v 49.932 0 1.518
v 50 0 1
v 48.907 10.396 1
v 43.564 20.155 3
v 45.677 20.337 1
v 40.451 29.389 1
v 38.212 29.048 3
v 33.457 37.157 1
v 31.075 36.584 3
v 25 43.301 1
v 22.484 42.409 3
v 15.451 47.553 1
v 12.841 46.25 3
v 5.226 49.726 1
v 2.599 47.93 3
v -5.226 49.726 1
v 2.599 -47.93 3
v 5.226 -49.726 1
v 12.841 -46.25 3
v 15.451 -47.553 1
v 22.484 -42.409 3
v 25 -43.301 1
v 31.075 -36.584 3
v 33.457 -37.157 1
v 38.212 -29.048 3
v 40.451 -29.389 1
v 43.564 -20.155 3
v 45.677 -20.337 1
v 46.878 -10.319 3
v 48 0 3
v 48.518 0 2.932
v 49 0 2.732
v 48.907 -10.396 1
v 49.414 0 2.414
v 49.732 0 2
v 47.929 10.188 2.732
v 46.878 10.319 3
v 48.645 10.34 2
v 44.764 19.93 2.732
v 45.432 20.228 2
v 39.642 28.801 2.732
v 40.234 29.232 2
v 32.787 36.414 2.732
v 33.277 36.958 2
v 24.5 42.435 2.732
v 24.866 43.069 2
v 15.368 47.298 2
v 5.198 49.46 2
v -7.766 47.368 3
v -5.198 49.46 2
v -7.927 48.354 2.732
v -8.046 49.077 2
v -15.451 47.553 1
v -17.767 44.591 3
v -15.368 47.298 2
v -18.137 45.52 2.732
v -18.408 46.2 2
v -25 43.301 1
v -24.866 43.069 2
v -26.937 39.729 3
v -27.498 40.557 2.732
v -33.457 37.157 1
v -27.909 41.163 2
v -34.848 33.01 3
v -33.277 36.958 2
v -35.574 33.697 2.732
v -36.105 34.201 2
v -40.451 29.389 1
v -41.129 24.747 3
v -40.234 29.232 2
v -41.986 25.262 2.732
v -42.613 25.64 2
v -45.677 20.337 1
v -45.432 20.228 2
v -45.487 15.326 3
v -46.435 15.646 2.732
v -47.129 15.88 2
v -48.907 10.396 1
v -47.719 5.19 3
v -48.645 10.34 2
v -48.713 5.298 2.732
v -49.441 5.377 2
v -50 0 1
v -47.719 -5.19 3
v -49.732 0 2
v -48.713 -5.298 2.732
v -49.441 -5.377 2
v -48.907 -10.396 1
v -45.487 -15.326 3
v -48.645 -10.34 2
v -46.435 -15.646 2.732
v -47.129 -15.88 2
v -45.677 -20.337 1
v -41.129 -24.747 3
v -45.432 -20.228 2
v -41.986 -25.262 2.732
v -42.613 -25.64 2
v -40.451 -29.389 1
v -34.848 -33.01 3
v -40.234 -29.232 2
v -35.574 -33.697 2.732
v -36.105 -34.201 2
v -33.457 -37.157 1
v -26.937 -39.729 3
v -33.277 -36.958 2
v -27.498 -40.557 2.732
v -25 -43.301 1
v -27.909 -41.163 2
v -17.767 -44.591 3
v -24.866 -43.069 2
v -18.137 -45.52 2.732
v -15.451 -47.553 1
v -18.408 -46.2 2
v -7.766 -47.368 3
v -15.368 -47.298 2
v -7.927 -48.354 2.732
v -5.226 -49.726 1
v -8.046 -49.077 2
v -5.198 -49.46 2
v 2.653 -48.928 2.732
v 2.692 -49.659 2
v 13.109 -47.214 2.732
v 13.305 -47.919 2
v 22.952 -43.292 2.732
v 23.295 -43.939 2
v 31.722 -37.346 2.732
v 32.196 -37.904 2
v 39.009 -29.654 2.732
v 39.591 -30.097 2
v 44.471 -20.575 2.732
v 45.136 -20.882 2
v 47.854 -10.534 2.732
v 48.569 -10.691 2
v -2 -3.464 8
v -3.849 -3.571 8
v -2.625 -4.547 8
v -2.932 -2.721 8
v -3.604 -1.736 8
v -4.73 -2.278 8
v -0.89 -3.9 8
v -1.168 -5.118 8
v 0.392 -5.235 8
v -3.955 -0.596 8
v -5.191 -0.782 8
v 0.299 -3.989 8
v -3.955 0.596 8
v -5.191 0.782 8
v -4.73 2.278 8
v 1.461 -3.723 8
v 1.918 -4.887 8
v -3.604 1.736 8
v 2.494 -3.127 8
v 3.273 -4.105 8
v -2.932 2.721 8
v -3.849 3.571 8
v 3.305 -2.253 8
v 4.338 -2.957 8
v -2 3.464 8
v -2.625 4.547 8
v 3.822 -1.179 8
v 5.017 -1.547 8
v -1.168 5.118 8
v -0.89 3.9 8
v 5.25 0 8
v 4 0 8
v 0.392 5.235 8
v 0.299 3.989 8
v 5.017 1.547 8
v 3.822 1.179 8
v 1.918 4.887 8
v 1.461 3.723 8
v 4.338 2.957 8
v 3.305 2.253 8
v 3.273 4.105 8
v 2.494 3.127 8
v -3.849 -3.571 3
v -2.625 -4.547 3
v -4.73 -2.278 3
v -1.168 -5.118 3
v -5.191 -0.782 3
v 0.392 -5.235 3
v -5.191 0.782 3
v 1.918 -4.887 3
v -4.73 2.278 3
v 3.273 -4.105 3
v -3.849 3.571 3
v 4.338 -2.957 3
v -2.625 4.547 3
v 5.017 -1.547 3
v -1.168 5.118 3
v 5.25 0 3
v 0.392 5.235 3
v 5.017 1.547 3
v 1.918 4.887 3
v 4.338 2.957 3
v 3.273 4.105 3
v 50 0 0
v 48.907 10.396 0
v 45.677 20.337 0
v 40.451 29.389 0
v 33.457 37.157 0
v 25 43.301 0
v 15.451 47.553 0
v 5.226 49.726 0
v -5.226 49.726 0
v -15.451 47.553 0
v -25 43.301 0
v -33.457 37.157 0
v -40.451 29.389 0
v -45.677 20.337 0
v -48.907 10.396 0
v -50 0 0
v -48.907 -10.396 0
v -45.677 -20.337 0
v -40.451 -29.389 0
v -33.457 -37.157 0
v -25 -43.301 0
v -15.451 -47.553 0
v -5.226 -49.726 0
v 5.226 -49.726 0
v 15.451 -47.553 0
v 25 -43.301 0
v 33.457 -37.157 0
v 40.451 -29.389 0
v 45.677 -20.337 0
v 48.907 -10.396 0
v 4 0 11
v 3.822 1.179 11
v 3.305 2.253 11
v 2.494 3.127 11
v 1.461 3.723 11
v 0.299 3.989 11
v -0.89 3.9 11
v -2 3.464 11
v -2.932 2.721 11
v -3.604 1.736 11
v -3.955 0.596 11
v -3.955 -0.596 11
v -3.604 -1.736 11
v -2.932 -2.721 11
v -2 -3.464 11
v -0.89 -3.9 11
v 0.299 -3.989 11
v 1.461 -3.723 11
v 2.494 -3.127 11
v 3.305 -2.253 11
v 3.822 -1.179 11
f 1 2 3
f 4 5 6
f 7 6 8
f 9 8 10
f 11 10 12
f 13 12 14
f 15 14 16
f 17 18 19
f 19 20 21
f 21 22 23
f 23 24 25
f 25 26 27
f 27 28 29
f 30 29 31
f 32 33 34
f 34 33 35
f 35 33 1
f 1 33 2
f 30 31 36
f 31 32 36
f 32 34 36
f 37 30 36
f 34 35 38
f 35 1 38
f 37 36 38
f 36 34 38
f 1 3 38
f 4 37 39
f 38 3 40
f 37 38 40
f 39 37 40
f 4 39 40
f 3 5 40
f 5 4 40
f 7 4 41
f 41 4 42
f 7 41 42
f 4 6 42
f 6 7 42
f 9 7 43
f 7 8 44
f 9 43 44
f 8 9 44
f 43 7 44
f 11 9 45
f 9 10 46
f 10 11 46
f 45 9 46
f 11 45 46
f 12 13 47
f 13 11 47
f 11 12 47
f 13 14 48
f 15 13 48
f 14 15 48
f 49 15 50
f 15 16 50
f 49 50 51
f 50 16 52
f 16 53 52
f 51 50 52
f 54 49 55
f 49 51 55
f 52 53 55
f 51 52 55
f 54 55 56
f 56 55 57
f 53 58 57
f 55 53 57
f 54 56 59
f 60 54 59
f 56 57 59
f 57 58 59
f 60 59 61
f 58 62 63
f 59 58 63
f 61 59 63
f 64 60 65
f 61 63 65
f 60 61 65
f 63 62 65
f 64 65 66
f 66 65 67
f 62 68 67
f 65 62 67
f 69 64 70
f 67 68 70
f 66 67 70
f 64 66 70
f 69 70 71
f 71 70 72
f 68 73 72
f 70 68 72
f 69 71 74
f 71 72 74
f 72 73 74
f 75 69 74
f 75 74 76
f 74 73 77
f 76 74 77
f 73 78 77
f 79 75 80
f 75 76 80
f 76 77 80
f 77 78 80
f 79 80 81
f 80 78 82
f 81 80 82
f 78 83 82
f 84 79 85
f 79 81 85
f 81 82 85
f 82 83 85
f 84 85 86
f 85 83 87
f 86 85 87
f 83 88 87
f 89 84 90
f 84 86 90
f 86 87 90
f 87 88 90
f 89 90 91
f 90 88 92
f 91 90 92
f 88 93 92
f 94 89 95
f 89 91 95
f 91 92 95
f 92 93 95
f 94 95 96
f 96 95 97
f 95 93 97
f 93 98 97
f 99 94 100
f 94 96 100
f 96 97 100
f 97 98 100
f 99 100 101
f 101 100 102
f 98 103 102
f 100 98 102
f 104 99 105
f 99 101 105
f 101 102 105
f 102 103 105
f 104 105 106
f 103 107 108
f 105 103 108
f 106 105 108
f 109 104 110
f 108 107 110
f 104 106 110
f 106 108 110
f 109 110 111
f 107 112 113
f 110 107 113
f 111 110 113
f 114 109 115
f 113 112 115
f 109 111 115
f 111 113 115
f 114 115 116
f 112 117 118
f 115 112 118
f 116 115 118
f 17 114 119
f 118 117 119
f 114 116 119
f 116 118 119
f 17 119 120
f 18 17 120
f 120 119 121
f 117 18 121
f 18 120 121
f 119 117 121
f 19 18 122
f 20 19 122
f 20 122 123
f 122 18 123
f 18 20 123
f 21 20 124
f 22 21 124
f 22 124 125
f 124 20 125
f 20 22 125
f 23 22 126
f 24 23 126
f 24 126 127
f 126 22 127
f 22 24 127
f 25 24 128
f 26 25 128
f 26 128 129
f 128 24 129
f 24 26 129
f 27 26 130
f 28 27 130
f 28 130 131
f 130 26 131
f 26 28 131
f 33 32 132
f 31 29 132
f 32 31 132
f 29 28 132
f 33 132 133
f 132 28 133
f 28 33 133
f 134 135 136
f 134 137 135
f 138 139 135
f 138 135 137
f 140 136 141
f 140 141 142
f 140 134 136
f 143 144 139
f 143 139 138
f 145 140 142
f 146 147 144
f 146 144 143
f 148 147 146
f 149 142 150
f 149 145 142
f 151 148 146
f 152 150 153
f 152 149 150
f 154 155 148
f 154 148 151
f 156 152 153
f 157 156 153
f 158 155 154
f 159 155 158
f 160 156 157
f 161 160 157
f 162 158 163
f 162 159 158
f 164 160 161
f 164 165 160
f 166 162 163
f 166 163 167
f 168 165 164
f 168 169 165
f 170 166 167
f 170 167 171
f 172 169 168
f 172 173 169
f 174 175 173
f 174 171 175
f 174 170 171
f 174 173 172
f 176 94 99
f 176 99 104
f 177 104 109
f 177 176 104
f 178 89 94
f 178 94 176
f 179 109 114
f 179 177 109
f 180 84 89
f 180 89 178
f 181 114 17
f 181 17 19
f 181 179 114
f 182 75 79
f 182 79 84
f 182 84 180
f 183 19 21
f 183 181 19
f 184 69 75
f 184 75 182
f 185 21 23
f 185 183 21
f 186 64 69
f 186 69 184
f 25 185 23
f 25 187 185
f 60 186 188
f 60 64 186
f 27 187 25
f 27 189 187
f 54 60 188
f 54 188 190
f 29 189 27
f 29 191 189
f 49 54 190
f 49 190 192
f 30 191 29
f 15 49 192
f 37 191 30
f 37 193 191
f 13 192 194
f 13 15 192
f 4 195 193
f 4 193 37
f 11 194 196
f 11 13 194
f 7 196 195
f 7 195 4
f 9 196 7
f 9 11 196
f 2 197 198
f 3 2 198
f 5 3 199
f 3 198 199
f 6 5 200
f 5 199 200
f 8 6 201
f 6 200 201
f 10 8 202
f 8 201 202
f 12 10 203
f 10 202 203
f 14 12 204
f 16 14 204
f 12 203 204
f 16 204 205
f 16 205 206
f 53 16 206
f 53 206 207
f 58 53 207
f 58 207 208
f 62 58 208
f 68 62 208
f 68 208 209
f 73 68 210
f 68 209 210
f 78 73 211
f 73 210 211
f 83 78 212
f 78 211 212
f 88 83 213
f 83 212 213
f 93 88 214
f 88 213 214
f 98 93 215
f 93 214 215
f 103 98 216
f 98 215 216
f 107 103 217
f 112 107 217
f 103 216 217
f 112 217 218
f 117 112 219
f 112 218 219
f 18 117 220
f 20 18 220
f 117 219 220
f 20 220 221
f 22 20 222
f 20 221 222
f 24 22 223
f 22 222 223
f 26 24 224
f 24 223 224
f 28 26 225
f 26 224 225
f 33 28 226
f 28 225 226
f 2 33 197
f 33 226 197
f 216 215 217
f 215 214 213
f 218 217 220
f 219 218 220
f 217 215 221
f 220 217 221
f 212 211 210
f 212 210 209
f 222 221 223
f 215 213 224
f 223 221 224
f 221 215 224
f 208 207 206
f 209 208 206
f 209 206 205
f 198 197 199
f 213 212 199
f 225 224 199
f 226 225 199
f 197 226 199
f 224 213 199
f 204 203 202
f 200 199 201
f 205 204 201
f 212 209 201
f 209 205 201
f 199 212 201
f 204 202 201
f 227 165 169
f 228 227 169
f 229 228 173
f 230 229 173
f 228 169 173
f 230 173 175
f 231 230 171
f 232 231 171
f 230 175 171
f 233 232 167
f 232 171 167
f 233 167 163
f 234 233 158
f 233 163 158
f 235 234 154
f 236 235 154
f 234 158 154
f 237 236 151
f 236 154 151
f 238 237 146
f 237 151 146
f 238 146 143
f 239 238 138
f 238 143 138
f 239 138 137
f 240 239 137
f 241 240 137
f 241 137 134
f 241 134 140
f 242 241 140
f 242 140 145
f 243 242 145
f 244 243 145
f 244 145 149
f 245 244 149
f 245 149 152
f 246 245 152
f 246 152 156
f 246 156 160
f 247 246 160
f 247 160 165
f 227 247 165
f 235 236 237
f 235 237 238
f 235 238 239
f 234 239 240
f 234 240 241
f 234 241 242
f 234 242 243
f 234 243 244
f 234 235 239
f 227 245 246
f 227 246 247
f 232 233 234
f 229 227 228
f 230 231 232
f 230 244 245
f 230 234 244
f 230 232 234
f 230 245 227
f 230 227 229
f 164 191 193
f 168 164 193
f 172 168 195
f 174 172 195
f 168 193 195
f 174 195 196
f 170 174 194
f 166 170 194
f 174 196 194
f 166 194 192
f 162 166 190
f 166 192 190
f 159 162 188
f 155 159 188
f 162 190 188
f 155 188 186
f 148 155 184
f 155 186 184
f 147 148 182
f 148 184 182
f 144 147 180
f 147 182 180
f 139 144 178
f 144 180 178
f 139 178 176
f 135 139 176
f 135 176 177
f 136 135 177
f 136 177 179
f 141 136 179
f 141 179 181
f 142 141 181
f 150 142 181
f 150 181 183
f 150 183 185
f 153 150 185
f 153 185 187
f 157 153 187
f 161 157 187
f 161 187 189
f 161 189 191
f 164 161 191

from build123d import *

# Parameters (mm, degrees)
F0_R     = 50
F0_R_2   = 5.25
F1_DEPTH = 3
F0_R_3   = 4
F2_DEPTH = 8
F3_DEPTH = 11
F4_R     = 2


with BuildPart() as f1:
    # F0 (on Top) → F1 (new body)
    with BuildSketch(Plane.XY):
        Circle(F0_R)
        Circle(F0_R_2, mode=Mode.SUBTRACT)
    extrude(amount=F1_DEPTH)

    # F0 (on Top) → F2 (join)
    with BuildSketch(Plane.XY):
        Circle(F0_R_2)
        Circle(F0_R_3, mode=Mode.SUBTRACT)
    extrude(amount=F2_DEPTH)

    # F0 (on Top) → F3 (join)
    with BuildSketch(Plane.XY):
        Circle(F0_R_3)
    extrude(amount=F3_DEPTH)

    # F4
    f4_edges = [f1.edges().sort_by_distance(p)[0] for p in [
        (-50, 0, 3),
    ]]
    fillet(f4_edges, radius=F4_R)


solid = f1.part
